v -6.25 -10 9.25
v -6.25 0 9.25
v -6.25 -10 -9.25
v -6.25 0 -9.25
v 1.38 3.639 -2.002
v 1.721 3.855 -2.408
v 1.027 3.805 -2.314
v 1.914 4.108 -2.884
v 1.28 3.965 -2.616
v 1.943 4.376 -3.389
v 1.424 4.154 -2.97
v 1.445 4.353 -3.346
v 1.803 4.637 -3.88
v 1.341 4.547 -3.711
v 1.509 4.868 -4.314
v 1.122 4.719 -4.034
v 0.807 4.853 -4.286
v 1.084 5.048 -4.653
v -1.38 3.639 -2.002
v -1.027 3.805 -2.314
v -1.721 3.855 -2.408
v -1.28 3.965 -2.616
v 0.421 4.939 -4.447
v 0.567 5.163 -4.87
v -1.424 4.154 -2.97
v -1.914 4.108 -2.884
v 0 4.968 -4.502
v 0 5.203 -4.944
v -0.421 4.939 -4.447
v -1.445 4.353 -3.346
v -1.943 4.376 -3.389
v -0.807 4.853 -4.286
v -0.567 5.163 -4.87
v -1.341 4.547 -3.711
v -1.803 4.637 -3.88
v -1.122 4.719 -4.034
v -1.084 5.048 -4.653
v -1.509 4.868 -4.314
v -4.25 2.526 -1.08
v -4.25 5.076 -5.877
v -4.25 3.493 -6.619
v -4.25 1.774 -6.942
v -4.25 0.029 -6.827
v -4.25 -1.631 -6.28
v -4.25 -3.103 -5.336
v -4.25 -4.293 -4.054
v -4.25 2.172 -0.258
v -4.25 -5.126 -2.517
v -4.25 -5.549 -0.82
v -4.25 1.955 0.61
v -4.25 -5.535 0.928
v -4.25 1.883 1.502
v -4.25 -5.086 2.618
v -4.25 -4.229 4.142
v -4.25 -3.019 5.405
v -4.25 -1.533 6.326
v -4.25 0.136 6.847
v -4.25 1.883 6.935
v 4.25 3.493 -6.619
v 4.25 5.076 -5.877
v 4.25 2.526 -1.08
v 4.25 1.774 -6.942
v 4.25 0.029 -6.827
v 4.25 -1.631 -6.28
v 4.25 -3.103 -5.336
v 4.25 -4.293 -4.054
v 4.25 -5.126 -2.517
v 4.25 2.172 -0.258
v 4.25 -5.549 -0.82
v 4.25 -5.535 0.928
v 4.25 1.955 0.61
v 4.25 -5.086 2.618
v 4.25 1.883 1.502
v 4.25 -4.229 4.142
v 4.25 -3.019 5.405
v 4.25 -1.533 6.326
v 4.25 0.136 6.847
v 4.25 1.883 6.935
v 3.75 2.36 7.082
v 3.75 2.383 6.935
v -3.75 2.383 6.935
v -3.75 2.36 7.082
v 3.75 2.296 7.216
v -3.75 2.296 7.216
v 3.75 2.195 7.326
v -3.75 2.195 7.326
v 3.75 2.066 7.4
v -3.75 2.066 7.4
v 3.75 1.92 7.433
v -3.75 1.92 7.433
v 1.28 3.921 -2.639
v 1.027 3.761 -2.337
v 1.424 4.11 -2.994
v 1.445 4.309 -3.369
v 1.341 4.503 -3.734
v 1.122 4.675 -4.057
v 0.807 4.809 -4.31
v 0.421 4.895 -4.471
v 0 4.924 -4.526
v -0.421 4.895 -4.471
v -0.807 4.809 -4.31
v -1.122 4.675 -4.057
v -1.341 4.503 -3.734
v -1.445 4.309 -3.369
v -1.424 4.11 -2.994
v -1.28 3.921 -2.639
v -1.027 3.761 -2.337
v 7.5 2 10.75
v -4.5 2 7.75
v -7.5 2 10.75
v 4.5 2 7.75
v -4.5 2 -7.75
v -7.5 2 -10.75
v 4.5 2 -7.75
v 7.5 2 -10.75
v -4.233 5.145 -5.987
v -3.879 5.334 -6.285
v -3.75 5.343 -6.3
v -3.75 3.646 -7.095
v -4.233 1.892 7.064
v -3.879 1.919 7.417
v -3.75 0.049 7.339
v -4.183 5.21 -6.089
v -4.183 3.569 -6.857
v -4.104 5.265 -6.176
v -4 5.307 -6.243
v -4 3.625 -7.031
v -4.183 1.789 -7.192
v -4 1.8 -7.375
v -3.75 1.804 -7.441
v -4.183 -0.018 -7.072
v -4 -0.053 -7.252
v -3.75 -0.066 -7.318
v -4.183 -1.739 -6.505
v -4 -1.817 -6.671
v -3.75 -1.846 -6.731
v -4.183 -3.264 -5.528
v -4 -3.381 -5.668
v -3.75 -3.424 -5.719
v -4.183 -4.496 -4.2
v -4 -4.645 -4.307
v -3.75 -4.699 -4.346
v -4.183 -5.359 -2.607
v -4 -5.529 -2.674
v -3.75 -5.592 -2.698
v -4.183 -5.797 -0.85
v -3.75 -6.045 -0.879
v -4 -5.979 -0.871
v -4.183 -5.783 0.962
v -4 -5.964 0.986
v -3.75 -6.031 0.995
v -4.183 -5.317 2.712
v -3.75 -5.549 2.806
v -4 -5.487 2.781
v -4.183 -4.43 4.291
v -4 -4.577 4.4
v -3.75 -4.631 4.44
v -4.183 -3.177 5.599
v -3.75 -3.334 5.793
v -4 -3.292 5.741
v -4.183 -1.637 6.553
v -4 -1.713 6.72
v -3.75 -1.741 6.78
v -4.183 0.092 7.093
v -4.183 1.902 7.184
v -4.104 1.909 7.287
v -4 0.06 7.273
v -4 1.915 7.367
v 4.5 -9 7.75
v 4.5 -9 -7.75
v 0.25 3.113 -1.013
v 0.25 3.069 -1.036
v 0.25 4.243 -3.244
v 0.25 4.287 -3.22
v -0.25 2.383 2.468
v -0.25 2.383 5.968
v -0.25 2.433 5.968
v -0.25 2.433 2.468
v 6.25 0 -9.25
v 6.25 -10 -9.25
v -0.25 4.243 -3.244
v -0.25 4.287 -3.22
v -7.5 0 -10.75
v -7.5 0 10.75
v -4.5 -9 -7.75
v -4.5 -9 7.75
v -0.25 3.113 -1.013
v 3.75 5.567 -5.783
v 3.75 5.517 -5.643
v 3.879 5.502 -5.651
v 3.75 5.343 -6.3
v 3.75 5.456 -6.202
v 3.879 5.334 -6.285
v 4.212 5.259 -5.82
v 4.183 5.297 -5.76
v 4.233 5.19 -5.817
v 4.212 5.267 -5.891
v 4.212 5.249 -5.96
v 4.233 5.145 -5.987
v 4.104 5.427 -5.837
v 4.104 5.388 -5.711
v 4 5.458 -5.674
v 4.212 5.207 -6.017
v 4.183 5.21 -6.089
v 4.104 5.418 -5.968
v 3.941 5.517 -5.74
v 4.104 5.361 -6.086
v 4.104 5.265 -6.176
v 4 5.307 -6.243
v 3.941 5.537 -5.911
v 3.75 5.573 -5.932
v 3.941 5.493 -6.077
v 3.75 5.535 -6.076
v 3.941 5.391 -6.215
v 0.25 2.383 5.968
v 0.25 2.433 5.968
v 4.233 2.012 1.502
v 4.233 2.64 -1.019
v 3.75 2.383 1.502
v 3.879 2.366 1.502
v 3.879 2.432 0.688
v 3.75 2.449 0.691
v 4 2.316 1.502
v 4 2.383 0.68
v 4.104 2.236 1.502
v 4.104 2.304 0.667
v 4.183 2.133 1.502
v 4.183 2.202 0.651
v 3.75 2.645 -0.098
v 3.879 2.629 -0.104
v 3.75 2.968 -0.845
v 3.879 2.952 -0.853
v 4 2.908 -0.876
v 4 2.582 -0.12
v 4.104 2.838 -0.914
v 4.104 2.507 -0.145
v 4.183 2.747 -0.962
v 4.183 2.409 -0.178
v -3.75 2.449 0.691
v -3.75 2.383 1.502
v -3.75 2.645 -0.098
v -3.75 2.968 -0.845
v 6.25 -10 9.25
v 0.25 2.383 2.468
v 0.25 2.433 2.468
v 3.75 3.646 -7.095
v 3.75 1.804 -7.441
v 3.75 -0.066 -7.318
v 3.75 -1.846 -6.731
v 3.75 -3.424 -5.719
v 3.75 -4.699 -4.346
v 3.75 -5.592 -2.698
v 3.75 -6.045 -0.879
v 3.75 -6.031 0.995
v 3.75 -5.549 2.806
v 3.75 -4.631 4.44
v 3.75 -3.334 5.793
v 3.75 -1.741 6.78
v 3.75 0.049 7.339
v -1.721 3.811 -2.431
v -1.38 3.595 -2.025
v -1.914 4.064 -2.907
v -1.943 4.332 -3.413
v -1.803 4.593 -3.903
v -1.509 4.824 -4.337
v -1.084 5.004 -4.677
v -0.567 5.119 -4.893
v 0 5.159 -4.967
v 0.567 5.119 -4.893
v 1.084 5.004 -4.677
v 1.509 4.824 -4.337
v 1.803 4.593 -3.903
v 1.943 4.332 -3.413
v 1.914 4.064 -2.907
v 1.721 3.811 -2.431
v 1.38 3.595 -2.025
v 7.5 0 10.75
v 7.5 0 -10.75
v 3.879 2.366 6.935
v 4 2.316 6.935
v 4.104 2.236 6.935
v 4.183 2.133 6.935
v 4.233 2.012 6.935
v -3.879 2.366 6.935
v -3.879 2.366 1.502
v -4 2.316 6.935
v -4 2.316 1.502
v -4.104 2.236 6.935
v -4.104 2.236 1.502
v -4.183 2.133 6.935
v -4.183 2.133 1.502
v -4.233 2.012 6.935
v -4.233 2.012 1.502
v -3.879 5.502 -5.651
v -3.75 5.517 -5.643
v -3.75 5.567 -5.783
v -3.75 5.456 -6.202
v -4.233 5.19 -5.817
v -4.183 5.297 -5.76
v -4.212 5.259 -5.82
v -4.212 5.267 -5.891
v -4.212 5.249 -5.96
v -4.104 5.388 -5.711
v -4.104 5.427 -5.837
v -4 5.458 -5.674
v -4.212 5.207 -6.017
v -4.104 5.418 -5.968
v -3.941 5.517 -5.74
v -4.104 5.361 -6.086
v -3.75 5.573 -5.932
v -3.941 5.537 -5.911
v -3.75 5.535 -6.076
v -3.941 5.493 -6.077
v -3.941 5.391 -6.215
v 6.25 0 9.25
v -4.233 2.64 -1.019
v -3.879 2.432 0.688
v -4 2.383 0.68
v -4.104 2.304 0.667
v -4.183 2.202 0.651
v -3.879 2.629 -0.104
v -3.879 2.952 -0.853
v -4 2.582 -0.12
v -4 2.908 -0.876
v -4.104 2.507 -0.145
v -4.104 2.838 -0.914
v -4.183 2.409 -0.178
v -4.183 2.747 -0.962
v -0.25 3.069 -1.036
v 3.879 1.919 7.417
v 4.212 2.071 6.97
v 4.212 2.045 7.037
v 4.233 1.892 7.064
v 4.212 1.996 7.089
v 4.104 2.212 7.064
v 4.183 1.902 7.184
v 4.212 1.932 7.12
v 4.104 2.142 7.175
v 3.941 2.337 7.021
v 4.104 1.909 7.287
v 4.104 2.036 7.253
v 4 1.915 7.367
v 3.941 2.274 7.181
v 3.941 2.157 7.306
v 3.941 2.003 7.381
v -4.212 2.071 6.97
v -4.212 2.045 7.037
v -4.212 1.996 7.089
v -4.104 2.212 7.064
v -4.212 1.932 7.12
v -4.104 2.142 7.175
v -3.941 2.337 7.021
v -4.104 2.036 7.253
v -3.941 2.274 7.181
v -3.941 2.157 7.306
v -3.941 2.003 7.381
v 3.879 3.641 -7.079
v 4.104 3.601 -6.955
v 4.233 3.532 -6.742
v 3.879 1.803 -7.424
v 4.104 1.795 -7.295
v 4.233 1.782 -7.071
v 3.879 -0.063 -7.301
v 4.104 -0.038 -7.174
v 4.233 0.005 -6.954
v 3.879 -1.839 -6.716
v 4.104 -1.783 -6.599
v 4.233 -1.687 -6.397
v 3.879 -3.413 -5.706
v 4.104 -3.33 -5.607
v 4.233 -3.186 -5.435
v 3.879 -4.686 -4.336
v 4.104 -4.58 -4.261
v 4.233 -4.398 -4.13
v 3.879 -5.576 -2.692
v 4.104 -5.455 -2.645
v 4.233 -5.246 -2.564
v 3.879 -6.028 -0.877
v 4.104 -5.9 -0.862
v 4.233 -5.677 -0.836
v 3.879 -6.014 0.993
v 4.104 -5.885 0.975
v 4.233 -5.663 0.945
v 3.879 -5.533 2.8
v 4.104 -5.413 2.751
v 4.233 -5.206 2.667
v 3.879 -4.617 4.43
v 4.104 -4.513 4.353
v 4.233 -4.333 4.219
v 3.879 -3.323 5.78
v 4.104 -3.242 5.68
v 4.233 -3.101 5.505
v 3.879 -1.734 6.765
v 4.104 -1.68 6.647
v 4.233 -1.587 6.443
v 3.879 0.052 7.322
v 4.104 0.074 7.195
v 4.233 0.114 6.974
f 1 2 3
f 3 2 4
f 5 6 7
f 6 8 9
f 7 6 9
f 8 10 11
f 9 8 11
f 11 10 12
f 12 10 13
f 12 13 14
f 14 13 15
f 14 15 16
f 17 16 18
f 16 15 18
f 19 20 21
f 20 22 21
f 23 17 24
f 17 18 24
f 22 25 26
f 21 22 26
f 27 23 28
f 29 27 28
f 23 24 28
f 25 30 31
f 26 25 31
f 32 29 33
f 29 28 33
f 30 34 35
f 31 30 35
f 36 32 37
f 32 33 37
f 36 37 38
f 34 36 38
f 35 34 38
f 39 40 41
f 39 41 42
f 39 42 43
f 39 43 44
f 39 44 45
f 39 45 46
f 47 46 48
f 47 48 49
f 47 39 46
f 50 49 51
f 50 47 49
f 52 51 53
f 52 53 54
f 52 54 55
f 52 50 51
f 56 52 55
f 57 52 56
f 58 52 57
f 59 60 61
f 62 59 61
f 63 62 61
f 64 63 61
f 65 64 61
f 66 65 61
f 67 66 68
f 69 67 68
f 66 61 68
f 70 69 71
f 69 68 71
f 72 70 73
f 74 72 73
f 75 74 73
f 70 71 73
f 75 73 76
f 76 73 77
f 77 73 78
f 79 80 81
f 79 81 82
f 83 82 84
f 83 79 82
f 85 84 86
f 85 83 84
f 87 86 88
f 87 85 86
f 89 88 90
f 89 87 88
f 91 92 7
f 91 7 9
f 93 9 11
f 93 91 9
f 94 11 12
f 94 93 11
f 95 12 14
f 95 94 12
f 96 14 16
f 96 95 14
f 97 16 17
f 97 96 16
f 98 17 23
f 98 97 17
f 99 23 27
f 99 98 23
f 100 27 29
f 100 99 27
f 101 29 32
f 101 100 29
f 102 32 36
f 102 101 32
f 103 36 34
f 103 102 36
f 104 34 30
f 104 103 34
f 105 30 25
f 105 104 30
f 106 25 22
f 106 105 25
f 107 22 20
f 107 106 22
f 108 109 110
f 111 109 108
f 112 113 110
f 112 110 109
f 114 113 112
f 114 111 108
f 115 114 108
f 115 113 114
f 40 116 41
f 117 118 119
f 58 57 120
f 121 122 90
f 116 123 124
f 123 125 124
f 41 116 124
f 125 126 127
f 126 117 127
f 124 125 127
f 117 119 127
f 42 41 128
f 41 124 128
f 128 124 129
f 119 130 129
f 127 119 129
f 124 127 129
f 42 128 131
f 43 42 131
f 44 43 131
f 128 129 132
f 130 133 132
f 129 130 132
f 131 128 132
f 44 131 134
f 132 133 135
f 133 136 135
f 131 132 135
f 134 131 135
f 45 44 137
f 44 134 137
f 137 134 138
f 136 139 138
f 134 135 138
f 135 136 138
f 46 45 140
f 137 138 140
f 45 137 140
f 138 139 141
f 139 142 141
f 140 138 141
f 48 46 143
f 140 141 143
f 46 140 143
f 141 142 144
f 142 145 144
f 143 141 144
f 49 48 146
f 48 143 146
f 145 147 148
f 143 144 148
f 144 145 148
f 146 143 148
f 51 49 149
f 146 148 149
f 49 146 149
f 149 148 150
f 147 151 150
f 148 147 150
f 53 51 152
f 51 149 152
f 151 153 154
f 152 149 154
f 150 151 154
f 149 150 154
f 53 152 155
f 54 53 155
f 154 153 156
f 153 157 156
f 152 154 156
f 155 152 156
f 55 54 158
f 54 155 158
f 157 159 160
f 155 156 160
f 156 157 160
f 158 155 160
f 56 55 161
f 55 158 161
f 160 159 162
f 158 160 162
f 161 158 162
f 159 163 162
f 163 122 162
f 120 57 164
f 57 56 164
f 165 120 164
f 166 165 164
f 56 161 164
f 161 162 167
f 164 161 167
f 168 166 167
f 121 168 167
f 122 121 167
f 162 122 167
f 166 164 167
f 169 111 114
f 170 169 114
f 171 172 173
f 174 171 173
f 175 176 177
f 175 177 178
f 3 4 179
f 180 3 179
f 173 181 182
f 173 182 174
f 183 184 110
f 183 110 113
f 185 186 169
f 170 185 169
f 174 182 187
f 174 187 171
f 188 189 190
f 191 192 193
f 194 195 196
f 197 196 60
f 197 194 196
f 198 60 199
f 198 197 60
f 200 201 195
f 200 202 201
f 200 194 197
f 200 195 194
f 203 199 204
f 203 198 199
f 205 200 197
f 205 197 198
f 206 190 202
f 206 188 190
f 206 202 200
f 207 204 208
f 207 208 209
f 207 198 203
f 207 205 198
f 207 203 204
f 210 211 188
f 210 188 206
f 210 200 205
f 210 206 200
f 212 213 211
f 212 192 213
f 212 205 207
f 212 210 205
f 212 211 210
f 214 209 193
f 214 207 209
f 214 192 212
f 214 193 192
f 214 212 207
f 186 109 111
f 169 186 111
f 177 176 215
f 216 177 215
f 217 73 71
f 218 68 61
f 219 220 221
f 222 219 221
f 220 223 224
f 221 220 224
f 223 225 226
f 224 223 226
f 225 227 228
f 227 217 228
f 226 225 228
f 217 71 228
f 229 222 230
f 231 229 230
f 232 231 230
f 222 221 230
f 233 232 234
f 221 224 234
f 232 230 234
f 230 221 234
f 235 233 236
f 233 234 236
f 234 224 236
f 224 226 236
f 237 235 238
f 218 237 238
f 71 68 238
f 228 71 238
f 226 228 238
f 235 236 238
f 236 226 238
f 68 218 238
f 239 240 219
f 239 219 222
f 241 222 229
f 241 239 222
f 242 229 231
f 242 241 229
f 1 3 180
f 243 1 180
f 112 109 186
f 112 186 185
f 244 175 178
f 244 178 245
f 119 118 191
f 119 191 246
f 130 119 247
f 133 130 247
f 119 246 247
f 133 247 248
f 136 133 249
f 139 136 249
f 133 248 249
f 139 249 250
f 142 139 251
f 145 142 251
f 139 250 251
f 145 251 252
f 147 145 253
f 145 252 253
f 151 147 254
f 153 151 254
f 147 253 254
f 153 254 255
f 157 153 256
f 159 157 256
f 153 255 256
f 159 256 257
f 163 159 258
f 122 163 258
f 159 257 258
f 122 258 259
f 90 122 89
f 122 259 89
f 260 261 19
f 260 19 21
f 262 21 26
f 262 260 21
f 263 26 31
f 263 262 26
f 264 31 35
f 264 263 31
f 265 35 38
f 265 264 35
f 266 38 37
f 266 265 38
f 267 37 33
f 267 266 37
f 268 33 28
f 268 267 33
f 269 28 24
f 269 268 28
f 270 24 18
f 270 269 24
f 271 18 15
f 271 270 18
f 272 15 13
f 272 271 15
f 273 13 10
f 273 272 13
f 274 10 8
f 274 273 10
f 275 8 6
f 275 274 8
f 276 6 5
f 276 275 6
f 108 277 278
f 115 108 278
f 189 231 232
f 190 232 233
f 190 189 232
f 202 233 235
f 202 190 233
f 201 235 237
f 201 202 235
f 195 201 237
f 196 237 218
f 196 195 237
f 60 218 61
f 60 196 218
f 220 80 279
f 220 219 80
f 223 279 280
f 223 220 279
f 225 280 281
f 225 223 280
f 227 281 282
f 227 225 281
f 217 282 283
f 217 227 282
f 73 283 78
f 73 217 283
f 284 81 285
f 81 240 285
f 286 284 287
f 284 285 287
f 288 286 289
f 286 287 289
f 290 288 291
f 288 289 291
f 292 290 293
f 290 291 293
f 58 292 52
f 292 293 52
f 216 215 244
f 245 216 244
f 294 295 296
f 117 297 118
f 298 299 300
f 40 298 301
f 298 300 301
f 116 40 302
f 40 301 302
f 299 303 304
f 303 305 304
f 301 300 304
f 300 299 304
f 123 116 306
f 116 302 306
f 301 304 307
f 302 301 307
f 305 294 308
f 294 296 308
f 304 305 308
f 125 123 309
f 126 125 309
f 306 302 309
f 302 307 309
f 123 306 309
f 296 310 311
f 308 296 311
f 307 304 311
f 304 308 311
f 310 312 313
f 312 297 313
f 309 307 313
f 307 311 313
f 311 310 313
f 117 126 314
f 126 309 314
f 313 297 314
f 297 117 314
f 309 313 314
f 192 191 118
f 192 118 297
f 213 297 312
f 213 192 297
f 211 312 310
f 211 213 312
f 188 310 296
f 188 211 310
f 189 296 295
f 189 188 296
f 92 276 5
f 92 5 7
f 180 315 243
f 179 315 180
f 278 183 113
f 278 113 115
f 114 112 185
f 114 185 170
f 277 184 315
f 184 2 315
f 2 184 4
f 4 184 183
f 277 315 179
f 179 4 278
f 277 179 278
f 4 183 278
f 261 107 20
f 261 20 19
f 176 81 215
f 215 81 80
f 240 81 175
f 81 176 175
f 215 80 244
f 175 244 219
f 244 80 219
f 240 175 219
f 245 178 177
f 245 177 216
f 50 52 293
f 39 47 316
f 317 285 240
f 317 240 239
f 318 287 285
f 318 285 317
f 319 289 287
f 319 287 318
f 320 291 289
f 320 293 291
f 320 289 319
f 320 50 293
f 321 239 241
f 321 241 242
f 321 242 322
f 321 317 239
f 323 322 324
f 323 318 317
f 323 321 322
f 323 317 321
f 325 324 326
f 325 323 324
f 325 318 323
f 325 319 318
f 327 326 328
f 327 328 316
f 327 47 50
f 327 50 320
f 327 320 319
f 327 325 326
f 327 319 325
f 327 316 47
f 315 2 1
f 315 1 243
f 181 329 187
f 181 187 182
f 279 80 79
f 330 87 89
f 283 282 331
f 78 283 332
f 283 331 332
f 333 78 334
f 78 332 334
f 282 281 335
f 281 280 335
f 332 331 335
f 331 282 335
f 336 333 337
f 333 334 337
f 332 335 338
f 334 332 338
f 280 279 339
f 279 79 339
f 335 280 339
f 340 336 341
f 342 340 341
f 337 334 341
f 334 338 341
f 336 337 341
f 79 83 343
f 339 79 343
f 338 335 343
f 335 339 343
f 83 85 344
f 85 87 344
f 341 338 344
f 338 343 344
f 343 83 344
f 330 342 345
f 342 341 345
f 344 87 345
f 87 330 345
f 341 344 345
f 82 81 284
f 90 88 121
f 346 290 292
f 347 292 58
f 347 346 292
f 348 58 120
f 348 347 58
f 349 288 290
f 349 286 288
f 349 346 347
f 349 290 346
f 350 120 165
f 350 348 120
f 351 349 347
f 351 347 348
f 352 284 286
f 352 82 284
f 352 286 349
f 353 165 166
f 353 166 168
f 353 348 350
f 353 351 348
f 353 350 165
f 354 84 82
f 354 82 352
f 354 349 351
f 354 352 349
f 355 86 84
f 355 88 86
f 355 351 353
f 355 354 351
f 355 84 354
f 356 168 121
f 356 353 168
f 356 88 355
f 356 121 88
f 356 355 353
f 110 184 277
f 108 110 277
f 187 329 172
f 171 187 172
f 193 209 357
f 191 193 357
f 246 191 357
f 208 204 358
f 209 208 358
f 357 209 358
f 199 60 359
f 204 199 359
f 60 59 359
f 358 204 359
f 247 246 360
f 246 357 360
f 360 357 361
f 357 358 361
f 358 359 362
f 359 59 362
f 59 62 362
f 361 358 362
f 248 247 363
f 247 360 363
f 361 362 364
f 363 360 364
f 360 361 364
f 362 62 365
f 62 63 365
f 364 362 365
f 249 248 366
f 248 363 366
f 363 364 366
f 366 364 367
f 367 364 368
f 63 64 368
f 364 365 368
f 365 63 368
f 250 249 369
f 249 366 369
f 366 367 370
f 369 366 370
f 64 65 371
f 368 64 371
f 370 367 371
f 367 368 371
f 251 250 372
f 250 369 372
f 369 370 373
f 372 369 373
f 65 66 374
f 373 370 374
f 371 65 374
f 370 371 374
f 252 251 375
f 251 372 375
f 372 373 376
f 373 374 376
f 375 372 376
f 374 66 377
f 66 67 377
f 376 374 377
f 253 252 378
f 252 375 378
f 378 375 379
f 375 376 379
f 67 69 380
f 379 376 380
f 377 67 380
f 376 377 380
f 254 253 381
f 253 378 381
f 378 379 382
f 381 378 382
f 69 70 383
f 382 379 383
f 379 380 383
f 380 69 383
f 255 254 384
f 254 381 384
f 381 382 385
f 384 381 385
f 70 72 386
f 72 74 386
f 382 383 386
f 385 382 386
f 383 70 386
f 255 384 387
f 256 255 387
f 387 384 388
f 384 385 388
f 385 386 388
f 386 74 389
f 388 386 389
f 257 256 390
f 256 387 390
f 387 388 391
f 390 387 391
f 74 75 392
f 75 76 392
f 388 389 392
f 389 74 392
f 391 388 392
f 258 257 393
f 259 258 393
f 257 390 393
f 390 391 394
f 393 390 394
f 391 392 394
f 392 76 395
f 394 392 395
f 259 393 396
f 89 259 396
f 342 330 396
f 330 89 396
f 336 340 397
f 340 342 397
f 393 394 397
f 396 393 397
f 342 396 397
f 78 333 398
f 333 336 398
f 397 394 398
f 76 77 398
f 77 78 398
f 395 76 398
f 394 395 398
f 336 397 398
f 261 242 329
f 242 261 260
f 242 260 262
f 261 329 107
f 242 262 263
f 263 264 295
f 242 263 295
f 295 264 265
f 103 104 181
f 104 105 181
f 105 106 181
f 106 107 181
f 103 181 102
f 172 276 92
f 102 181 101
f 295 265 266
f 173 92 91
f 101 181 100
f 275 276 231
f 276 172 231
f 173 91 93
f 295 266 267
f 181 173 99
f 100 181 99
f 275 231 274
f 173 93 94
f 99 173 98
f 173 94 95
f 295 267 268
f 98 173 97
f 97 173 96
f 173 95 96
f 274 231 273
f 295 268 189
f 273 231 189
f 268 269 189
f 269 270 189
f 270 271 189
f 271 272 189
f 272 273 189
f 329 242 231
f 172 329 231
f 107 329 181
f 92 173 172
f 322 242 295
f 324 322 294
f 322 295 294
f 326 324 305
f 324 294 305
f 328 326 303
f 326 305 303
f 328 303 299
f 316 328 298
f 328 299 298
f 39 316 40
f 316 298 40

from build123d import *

# Parameters (mm, degrees)
SKETCH1_W           = 12.5
SKETCH1_H           = 18.5
BOSS_EXTRUDE1_DEPTH = 10
SKETCH2_W           = 15
SKETCH2_H           = 21.5
BOSS_EXTRUDE2_DEPTH = 2
SKETCH3_W           = 9
SKETCH3_H           = 15.5
CUT_EXTRUDE1_DEPTH  = 11
BOSS_EXTRUDE3_DEPTH = 4.25
FILLET1_R           = 5
FILLET2_R           = 0.5
SKETCH6_W           = 0.5
SKETCH6_H           = 3.5
BOSS_EXTRUDE4_DEPTH = 0.05
SKETCH7_W           = 0.5
SKETCH7_H           = 2.5
BOSS_EXTRUDE5_DEPTH = 0.05


with BuildPart() as part:
    # Sketch1 → Boss-Extrude1 (new body)
    with BuildSketch(Plane(origin=(0, 0, 0), x_dir=(1, 0, 0), z_dir=(0, 1, 0))):
        Rectangle(SKETCH1_W, SKETCH1_H)
    extrude(amount=-BOSS_EXTRUDE1_DEPTH)

    # Sketch2 → Boss-Extrude2 (add)
    with BuildSketch(Plane(origin=(0, 0, 0), x_dir=(1, 0, 0), z_dir=(0, 1, 0))):
        Rectangle(SKETCH2_W, SKETCH2_H)
    extrude(amount=BOSS_EXTRUDE2_DEPTH)

    # Sketch3 → Cut-Extrude1 (cut)
    with BuildSketch(Plane(origin=(0, 2, 0), x_dir=(1, 0, 0), z_dir=(0, 1, 0))):
        Rectangle(SKETCH3_W, SKETCH3_H)
    extrude(amount=-CUT_EXTRUDE1_DEPTH, mode=Mode.SUBTRACT)


with BuildPart() as body_2:
    # Sketch4 → Boss-Extrude3 (new, symmetric)
    with BuildSketch(Plane(origin=(0, 0, 0), x_dir=(0, 0, -1), z_dir=(1, 0, 0))):
        with BuildLine():
            Line((-7.383950938, 2.382654215), (-0.25550292, 2.382654215))
            Line((-0.25550292, 2.382654215), (6.03909208, 5.728225159))
            ThreePointArc((6.03909208, 5.728225159), (1.802878967, -5.875950696), (-7.383950938, 2.382654215))
        make_face()
    extrude(amount=BOSS_EXTRUDE3_DEPTH, both=True)

    # Fillet1
    fillet1_edges = [body_2.edges().sort_by_distance(p)[0] for p in [
        (0, 2.382654215, 0.25550292),
    ]]
    fillet(fillet1_edges, radius=FILLET1_R)

    # Fillet2
    fillet2_edges = [body_2.edges().sort_by_distance(p)[0] for p in [
        (-4.25, 2.382654215, 4.442829109),
        (4.25, 2.382654215, 4.442829109),
        (-4.25, 2.531076372, 0.292495788),
        (4.25, 2.531076372, 0.292495788),
        (4.25, -5.875950696, -1.802878967),
        (-4.25, 4.347878173, -3.442009136),
        (-4.25, -5.875950696, -1.802878967),
        (0, 2.382654215, 7.383950938),
        (0, 5.728225159, -6.03909208),
        (4.25, 4.347878173, -3.442009136),
    ]]
    fillet(fillet2_edges, radius=FILLET2_R)

    # Sketch6 → Boss-Extrude4 (add)
    with BuildSketch(Plane(origin=(0, 2.382654215, 0), x_dir=(1, 0, 0), z_dir=(0, 1, 0))):
        with Locations((0, -4.218312539)):
            Rectangle(SKETCH6_W, SKETCH6_H)
    extrude(amount=BOSS_EXTRUDE4_DEPTH)

    # Sketch7 → Boss-Extrude5 (add)
    with BuildSketch(Plane(origin=(0, 1.963720132, 1.043715285), x_dir=(1, 0, 0), z_dir=(0, 0.8830246056114482, 0.4693266941957877))):
        with BuildLine():
            Line((-1.026667717, 3.828769763), (-1.380221108, 3.475216372))
            ThreePointArc((-1.380221108, 3.475216372), (0, 6.80736489), (1.380221108, 3.475216372))
            Line((1.380221108, 3.475216372), (1.026667717, 3.828769763))
            ThreePointArc((1.026667717, 3.828769763), (0, 6.30736489), (-1.026667717, 3.828769763))
        make_face()
        with Locations((0, 3.60543748)):
            Rectangle(SKETCH7_W, SKETCH7_H)
    extrude(amount=BOSS_EXTRUDE5_DEPTH)


solid = Compound([part.part, body_2.part])
